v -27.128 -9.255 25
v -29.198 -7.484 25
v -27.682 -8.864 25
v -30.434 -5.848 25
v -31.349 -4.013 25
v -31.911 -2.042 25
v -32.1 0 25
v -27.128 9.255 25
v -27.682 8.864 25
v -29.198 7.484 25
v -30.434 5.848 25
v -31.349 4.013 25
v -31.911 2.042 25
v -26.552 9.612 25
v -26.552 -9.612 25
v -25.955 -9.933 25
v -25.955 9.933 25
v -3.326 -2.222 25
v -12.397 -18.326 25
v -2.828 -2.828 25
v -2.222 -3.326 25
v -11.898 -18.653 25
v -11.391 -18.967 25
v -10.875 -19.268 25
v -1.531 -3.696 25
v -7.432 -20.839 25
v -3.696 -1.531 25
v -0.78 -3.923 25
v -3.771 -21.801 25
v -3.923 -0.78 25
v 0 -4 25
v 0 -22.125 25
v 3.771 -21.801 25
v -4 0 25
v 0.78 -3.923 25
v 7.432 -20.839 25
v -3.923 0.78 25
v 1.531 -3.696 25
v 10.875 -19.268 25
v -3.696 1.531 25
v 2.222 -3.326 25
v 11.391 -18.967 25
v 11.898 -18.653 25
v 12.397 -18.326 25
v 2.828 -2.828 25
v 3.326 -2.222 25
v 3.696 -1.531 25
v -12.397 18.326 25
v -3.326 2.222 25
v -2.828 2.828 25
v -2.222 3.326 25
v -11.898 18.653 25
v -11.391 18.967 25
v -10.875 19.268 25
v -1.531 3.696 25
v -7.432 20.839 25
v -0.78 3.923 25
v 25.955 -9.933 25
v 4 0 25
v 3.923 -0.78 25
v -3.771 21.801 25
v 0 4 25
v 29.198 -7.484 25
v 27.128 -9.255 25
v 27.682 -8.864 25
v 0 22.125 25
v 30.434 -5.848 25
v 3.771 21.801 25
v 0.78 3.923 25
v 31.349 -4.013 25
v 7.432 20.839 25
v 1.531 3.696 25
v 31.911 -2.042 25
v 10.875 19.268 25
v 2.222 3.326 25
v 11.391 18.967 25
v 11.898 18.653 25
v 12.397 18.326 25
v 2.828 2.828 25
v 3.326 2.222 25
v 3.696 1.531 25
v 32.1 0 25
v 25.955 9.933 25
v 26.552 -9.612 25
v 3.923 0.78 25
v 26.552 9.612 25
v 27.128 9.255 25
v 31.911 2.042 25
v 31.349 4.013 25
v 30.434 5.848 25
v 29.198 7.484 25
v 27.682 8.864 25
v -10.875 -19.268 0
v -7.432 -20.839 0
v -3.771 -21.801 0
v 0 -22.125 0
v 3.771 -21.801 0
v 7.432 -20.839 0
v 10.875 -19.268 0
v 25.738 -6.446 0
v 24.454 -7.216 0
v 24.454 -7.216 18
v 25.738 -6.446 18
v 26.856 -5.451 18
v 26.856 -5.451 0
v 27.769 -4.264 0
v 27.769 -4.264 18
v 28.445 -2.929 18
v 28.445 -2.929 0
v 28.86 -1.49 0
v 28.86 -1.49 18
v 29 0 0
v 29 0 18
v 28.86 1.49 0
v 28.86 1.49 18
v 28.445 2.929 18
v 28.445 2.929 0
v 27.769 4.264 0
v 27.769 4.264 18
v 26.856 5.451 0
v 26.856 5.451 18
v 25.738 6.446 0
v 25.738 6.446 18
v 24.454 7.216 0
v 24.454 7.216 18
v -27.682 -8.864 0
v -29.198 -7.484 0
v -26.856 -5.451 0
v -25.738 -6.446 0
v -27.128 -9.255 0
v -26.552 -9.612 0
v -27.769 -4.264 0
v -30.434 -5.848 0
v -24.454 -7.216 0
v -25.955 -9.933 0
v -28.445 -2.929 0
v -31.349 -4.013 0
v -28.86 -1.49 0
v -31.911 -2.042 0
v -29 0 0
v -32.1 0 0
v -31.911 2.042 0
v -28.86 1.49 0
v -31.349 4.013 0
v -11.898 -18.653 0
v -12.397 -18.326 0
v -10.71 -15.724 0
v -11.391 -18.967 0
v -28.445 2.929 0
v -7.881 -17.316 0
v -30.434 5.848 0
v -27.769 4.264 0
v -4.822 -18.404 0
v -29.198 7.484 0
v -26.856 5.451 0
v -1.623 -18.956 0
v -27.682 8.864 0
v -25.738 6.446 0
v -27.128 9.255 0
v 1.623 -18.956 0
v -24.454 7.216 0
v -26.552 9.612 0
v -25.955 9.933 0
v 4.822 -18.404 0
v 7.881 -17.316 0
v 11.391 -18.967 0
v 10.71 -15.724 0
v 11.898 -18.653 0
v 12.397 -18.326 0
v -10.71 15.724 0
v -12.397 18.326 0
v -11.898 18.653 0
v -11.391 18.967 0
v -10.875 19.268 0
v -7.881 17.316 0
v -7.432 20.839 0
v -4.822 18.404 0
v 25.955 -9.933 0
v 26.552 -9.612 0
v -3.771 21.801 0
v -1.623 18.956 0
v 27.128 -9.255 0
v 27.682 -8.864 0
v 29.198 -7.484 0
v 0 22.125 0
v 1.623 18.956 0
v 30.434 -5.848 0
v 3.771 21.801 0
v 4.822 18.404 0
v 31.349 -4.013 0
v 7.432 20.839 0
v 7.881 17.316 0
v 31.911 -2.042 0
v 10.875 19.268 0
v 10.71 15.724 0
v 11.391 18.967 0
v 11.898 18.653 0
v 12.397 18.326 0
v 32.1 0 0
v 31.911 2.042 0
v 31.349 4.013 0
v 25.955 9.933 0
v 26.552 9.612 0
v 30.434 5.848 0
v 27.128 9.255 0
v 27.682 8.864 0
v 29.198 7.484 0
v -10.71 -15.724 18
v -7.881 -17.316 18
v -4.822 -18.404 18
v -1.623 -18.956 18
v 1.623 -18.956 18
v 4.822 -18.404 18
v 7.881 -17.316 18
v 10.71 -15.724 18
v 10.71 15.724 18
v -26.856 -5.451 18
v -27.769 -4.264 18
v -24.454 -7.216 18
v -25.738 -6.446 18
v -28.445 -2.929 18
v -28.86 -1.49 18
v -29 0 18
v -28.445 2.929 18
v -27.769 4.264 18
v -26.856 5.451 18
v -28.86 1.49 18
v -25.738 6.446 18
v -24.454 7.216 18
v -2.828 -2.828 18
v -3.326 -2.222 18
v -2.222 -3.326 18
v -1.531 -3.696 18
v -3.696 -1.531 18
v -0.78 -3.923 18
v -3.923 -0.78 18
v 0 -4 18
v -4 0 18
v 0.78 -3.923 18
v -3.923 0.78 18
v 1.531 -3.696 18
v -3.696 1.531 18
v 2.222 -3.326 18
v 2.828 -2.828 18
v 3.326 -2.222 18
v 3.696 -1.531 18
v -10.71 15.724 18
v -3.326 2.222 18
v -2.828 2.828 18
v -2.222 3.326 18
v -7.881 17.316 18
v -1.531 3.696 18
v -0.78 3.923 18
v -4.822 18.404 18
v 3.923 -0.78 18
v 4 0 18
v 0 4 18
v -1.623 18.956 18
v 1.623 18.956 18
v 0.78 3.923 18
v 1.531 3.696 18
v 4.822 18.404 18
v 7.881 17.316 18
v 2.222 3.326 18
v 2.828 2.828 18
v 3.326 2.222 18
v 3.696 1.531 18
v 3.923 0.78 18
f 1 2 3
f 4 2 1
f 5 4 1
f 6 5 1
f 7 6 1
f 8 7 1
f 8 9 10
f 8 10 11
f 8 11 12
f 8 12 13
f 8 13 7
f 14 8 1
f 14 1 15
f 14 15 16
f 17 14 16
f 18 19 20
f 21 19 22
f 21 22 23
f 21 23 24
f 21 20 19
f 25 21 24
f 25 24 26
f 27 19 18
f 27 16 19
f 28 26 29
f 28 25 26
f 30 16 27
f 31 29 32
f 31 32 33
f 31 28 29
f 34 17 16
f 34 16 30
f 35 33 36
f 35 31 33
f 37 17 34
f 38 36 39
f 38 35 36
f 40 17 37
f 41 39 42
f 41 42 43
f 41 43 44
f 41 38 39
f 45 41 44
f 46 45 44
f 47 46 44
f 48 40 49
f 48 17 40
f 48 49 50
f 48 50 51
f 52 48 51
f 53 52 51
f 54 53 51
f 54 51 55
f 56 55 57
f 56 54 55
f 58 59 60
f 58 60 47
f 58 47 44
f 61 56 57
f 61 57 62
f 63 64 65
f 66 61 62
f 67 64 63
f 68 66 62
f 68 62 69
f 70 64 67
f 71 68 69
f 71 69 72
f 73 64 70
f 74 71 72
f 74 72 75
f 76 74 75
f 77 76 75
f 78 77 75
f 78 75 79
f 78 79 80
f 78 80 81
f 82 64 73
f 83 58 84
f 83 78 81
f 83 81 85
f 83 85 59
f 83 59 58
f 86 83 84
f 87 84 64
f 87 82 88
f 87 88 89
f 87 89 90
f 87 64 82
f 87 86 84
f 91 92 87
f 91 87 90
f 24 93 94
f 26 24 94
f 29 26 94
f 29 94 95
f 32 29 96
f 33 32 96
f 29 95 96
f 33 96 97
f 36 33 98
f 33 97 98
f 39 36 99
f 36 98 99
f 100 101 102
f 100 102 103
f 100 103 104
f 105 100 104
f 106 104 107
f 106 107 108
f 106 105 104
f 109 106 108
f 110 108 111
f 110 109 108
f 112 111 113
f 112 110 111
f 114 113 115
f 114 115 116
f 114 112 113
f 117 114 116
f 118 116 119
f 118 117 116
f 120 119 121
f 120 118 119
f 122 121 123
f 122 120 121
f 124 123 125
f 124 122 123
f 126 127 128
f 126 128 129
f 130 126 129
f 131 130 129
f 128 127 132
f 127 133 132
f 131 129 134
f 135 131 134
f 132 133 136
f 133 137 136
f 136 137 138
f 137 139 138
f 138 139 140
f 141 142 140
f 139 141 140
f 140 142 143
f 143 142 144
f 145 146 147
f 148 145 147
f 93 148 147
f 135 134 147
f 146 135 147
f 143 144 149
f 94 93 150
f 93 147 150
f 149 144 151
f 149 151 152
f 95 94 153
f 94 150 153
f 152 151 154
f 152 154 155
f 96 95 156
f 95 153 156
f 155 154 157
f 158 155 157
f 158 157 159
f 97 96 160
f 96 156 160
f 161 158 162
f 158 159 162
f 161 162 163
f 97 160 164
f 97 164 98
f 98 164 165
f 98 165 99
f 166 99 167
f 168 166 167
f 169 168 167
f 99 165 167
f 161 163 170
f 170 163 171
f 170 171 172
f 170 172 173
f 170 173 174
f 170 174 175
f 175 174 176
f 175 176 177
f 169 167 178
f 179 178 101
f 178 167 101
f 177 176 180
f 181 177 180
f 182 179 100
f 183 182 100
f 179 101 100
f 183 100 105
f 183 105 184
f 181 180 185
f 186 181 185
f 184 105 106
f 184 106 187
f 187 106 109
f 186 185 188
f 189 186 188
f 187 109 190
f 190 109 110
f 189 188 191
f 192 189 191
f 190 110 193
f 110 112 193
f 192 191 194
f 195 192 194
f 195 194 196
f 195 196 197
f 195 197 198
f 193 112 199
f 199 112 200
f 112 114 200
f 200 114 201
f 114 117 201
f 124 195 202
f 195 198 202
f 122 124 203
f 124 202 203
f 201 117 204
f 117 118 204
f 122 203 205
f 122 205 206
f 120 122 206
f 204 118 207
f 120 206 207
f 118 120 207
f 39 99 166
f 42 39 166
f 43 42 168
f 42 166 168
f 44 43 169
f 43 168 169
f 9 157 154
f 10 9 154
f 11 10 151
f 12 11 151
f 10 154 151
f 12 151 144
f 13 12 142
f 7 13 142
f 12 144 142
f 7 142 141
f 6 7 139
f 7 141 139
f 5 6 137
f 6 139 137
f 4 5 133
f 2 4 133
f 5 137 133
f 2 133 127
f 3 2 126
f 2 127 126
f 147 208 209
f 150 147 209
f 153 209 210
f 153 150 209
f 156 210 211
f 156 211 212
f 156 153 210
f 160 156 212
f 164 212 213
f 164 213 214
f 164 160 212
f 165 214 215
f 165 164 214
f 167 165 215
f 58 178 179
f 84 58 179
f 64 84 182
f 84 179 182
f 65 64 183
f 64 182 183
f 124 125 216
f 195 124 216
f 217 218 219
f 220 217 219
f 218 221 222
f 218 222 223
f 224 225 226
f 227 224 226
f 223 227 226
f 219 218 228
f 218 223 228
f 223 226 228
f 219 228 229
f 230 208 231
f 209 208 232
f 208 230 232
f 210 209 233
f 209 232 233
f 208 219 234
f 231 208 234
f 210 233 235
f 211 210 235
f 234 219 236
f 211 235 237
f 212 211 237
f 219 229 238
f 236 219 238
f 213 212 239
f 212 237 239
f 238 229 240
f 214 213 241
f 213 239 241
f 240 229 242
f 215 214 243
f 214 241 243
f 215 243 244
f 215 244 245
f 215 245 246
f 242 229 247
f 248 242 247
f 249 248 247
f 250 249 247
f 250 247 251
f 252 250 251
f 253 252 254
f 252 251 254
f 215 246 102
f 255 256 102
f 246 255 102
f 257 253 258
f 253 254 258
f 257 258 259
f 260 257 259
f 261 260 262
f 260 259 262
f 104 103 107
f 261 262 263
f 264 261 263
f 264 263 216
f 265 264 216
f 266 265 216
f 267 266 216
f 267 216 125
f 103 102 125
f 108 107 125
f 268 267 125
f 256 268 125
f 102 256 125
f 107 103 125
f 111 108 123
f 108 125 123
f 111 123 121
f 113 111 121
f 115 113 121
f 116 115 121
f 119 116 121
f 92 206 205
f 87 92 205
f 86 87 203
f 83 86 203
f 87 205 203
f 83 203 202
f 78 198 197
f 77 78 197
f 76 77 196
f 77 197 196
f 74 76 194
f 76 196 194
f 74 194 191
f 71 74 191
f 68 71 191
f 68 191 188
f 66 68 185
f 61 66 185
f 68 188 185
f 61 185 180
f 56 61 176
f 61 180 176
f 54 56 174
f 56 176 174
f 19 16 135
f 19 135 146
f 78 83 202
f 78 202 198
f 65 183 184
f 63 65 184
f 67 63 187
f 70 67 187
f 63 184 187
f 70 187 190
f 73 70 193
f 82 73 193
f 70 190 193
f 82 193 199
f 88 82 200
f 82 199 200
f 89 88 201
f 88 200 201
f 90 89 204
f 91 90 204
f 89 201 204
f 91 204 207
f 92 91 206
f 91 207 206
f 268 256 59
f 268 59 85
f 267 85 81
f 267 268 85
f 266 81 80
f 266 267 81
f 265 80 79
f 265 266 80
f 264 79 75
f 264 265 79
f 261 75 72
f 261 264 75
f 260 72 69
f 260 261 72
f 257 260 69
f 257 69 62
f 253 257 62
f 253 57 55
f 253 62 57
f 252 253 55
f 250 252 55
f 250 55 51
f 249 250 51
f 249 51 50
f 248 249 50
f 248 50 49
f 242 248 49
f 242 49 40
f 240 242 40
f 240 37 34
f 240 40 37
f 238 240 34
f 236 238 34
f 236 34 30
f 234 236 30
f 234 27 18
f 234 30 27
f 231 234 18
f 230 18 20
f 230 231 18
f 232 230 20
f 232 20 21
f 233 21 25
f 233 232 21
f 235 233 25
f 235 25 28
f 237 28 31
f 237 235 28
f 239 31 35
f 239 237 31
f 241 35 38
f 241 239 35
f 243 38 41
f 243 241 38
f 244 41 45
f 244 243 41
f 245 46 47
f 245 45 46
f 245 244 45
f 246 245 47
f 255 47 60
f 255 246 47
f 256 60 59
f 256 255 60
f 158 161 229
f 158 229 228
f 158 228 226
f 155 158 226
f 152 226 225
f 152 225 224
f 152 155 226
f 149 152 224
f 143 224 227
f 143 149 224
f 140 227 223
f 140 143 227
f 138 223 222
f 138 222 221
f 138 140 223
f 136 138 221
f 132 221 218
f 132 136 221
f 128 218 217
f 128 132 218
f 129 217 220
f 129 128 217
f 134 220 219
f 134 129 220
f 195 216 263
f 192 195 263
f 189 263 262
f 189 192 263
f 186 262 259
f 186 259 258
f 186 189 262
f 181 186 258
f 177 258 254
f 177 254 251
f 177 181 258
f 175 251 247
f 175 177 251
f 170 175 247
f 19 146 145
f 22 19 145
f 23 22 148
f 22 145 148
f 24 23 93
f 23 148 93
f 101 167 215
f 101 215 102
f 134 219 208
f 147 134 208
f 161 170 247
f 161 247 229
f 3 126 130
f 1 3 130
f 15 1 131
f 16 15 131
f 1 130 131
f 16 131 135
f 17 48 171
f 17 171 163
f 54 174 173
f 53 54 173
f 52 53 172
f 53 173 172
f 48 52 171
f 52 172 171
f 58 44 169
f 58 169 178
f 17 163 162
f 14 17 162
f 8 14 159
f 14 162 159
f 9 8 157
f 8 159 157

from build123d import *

# Parameters (mm, degrees)
F1_DEPTH = 25
F3_DEPTH = 18
F4_R     = 4
F5_DEPTH = 25.001


with BuildPart() as f1:
    # F0 (on Top) → F1 (new body)
    with BuildSketch(Plane.XY):
        with BuildLine():
            Line((-10.875151469, -19.2677633763), (-12.3969796785, -18.3256792466))
            ThreePointArc((-12.3969796785, -18.3256792466), (-11.6455958484, -18.8121163705), (-10.875151469, -19.2677633763))
        make_face()
        with BuildLine():
            Line((-25.9545587129, -9.9328922254), (-12.3969796785, -18.3256792466))
            Line((-12.3969796785, -18.3256792466), (-10.875151469, -19.2677633763))
            ThreePointArc((-10.875151469, -19.2677633763), (0, -22.125), (10.875151469, -19.2677633763))
            Line((10.875151469, -19.2677633763), (12.3969796785, -18.3256792466))
            Line((12.3969796785, -18.3256792466), (25.9545587129, -9.9328922254))
            Line((25.9545587129, -9.9328922254), (27.6815068609, -8.8638290861))
            ThreePointArc((27.6815068609, -8.8638290861), (32.1, 0), (27.6815068609, 8.8638290861))
            Line((27.6815068609, 8.8638290861), (25.9545587129, 9.9328922254))
            Line((25.9545587129, 9.9328922254), (12.3969796785, 18.3256792466))
            Line((12.3969796785, 18.3256792466), (10.875151469, 19.2677633763))
            ThreePointArc((10.875151469, 19.2677633763), (0, 22.125), (-10.875151469, 19.2677633763))
            Line((-10.875151469, 19.2677633763), (-12.3969796785, 18.3256792466))
            Line((-12.3969796785, 18.3256792466), (-25.9545587129, 9.9328922254))
            Line((-25.9545587129, 9.9328922254), (-27.6815068609, 8.8638290861))
            ThreePointArc((-27.6815068609, 8.8638290861), (-32.1, 0), (-27.6815068609, -8.8638290861))
            Line((-27.6815068609, -8.8638290861), (-25.9545587129, -9.9328922254))
        make_face()
        with BuildLine():
            ThreePointArc((-25.9545587129, 9.9328922254), (-26.8425362222, 9.4379431282), (-27.6815068609, 8.8638290861))
            Line((-27.6815068609, 8.8638290861), (-25.9545587129, 9.9328922254))
        make_face()
        with BuildLine():
            ThreePointArc((-10.875151469, 19.2677633763), (-11.6455958484, 18.8121163705), (-12.3969796785, 18.3256792466))
            Line((-12.3969796785, 18.3256792466), (-10.875151469, 19.2677633763))
        make_face()
        with BuildLine():
            ThreePointArc((12.3969796785, 18.3256792466), (11.6455958484, 18.8121163705), (10.875151469, 19.2677633763))
            Line((10.875151469, 19.2677633763), (12.3969796785, 18.3256792466))
        make_face()
        with BuildLine():
            Line((25.9545587129, 9.9328922254), (27.6815068609, 8.8638290861))
            ThreePointArc((27.6815068609, 8.8638290861), (26.8425362222, 9.4379431282), (25.9545587129, 9.9328922254))
        make_face()
        with BuildLine():
            Line((27.6815068609, -8.8638290861), (25.9545587129, -9.9328922254))
            ThreePointArc((25.9545587129, -9.9328922254), (26.8425362222, -9.4379431282), (27.6815068609, -8.8638290861))
        make_face()
        with BuildLine():
            ThreePointArc((-27.6815068609, -8.8638290861), (-26.8425362222, -9.4379431282), (-25.9545587129, -9.9328922254))
            Line((-25.9545587129, -9.9328922254), (-27.6815068609, -8.8638290861))
        make_face()
        with BuildLine():
            Line((12.3969796785, -18.3256792466), (10.875151469, -19.2677633763))
            ThreePointArc((10.875151469, -19.2677633763), (11.6455958484, -18.8121163705), (12.3969796785, -18.3256792466))
        make_face()
    extrude(amount=F1_DEPTH)

    # F2 (on Top) → F3 (cut)
    with BuildSketch(Plane.XY):
        with BuildLine():
            ThreePointArc((-24.4535832454, 7.2161457692), (-28.9999998122, 0), (-24.4535832454, -7.2161457692))
            Line((-24.4535832454, -7.2161457692), (-10.7099389872, -15.7241160243))
            ThreePointArc((-10.7099389872, -15.7241160243), (0, -19.0249998122), (10.7099389872, -15.7241160243))
            Line((10.7099389872, -15.7241160243), (24.4535832454, -7.2161457692))
            ThreePointArc((24.4535832454, -7.2161457692), (28.9999998122, 0), (24.4535832454, 7.2161457692))
            Line((24.4535832454, 7.2161457692), (10.7099389872, 15.7241160243))
            ThreePointArc((10.7099389872, 15.7241160243), (0, 19.0249998122), (-10.7099389872, 15.7241160243))
            Line((-10.7099389872, 15.7241160243), (-24.4535832454, 7.2161457692))
        make_face()
    extrude(amount=F3_DEPTH, mode=Mode.SUBTRACT)

    # F4 (on Top) → F5 (cut, through all)
    with BuildSketch(Plane.XY):
        Circle(F4_R)
    extrude(amount=F5_DEPTH, mode=Mode.SUBTRACT)


solid = f1.part
